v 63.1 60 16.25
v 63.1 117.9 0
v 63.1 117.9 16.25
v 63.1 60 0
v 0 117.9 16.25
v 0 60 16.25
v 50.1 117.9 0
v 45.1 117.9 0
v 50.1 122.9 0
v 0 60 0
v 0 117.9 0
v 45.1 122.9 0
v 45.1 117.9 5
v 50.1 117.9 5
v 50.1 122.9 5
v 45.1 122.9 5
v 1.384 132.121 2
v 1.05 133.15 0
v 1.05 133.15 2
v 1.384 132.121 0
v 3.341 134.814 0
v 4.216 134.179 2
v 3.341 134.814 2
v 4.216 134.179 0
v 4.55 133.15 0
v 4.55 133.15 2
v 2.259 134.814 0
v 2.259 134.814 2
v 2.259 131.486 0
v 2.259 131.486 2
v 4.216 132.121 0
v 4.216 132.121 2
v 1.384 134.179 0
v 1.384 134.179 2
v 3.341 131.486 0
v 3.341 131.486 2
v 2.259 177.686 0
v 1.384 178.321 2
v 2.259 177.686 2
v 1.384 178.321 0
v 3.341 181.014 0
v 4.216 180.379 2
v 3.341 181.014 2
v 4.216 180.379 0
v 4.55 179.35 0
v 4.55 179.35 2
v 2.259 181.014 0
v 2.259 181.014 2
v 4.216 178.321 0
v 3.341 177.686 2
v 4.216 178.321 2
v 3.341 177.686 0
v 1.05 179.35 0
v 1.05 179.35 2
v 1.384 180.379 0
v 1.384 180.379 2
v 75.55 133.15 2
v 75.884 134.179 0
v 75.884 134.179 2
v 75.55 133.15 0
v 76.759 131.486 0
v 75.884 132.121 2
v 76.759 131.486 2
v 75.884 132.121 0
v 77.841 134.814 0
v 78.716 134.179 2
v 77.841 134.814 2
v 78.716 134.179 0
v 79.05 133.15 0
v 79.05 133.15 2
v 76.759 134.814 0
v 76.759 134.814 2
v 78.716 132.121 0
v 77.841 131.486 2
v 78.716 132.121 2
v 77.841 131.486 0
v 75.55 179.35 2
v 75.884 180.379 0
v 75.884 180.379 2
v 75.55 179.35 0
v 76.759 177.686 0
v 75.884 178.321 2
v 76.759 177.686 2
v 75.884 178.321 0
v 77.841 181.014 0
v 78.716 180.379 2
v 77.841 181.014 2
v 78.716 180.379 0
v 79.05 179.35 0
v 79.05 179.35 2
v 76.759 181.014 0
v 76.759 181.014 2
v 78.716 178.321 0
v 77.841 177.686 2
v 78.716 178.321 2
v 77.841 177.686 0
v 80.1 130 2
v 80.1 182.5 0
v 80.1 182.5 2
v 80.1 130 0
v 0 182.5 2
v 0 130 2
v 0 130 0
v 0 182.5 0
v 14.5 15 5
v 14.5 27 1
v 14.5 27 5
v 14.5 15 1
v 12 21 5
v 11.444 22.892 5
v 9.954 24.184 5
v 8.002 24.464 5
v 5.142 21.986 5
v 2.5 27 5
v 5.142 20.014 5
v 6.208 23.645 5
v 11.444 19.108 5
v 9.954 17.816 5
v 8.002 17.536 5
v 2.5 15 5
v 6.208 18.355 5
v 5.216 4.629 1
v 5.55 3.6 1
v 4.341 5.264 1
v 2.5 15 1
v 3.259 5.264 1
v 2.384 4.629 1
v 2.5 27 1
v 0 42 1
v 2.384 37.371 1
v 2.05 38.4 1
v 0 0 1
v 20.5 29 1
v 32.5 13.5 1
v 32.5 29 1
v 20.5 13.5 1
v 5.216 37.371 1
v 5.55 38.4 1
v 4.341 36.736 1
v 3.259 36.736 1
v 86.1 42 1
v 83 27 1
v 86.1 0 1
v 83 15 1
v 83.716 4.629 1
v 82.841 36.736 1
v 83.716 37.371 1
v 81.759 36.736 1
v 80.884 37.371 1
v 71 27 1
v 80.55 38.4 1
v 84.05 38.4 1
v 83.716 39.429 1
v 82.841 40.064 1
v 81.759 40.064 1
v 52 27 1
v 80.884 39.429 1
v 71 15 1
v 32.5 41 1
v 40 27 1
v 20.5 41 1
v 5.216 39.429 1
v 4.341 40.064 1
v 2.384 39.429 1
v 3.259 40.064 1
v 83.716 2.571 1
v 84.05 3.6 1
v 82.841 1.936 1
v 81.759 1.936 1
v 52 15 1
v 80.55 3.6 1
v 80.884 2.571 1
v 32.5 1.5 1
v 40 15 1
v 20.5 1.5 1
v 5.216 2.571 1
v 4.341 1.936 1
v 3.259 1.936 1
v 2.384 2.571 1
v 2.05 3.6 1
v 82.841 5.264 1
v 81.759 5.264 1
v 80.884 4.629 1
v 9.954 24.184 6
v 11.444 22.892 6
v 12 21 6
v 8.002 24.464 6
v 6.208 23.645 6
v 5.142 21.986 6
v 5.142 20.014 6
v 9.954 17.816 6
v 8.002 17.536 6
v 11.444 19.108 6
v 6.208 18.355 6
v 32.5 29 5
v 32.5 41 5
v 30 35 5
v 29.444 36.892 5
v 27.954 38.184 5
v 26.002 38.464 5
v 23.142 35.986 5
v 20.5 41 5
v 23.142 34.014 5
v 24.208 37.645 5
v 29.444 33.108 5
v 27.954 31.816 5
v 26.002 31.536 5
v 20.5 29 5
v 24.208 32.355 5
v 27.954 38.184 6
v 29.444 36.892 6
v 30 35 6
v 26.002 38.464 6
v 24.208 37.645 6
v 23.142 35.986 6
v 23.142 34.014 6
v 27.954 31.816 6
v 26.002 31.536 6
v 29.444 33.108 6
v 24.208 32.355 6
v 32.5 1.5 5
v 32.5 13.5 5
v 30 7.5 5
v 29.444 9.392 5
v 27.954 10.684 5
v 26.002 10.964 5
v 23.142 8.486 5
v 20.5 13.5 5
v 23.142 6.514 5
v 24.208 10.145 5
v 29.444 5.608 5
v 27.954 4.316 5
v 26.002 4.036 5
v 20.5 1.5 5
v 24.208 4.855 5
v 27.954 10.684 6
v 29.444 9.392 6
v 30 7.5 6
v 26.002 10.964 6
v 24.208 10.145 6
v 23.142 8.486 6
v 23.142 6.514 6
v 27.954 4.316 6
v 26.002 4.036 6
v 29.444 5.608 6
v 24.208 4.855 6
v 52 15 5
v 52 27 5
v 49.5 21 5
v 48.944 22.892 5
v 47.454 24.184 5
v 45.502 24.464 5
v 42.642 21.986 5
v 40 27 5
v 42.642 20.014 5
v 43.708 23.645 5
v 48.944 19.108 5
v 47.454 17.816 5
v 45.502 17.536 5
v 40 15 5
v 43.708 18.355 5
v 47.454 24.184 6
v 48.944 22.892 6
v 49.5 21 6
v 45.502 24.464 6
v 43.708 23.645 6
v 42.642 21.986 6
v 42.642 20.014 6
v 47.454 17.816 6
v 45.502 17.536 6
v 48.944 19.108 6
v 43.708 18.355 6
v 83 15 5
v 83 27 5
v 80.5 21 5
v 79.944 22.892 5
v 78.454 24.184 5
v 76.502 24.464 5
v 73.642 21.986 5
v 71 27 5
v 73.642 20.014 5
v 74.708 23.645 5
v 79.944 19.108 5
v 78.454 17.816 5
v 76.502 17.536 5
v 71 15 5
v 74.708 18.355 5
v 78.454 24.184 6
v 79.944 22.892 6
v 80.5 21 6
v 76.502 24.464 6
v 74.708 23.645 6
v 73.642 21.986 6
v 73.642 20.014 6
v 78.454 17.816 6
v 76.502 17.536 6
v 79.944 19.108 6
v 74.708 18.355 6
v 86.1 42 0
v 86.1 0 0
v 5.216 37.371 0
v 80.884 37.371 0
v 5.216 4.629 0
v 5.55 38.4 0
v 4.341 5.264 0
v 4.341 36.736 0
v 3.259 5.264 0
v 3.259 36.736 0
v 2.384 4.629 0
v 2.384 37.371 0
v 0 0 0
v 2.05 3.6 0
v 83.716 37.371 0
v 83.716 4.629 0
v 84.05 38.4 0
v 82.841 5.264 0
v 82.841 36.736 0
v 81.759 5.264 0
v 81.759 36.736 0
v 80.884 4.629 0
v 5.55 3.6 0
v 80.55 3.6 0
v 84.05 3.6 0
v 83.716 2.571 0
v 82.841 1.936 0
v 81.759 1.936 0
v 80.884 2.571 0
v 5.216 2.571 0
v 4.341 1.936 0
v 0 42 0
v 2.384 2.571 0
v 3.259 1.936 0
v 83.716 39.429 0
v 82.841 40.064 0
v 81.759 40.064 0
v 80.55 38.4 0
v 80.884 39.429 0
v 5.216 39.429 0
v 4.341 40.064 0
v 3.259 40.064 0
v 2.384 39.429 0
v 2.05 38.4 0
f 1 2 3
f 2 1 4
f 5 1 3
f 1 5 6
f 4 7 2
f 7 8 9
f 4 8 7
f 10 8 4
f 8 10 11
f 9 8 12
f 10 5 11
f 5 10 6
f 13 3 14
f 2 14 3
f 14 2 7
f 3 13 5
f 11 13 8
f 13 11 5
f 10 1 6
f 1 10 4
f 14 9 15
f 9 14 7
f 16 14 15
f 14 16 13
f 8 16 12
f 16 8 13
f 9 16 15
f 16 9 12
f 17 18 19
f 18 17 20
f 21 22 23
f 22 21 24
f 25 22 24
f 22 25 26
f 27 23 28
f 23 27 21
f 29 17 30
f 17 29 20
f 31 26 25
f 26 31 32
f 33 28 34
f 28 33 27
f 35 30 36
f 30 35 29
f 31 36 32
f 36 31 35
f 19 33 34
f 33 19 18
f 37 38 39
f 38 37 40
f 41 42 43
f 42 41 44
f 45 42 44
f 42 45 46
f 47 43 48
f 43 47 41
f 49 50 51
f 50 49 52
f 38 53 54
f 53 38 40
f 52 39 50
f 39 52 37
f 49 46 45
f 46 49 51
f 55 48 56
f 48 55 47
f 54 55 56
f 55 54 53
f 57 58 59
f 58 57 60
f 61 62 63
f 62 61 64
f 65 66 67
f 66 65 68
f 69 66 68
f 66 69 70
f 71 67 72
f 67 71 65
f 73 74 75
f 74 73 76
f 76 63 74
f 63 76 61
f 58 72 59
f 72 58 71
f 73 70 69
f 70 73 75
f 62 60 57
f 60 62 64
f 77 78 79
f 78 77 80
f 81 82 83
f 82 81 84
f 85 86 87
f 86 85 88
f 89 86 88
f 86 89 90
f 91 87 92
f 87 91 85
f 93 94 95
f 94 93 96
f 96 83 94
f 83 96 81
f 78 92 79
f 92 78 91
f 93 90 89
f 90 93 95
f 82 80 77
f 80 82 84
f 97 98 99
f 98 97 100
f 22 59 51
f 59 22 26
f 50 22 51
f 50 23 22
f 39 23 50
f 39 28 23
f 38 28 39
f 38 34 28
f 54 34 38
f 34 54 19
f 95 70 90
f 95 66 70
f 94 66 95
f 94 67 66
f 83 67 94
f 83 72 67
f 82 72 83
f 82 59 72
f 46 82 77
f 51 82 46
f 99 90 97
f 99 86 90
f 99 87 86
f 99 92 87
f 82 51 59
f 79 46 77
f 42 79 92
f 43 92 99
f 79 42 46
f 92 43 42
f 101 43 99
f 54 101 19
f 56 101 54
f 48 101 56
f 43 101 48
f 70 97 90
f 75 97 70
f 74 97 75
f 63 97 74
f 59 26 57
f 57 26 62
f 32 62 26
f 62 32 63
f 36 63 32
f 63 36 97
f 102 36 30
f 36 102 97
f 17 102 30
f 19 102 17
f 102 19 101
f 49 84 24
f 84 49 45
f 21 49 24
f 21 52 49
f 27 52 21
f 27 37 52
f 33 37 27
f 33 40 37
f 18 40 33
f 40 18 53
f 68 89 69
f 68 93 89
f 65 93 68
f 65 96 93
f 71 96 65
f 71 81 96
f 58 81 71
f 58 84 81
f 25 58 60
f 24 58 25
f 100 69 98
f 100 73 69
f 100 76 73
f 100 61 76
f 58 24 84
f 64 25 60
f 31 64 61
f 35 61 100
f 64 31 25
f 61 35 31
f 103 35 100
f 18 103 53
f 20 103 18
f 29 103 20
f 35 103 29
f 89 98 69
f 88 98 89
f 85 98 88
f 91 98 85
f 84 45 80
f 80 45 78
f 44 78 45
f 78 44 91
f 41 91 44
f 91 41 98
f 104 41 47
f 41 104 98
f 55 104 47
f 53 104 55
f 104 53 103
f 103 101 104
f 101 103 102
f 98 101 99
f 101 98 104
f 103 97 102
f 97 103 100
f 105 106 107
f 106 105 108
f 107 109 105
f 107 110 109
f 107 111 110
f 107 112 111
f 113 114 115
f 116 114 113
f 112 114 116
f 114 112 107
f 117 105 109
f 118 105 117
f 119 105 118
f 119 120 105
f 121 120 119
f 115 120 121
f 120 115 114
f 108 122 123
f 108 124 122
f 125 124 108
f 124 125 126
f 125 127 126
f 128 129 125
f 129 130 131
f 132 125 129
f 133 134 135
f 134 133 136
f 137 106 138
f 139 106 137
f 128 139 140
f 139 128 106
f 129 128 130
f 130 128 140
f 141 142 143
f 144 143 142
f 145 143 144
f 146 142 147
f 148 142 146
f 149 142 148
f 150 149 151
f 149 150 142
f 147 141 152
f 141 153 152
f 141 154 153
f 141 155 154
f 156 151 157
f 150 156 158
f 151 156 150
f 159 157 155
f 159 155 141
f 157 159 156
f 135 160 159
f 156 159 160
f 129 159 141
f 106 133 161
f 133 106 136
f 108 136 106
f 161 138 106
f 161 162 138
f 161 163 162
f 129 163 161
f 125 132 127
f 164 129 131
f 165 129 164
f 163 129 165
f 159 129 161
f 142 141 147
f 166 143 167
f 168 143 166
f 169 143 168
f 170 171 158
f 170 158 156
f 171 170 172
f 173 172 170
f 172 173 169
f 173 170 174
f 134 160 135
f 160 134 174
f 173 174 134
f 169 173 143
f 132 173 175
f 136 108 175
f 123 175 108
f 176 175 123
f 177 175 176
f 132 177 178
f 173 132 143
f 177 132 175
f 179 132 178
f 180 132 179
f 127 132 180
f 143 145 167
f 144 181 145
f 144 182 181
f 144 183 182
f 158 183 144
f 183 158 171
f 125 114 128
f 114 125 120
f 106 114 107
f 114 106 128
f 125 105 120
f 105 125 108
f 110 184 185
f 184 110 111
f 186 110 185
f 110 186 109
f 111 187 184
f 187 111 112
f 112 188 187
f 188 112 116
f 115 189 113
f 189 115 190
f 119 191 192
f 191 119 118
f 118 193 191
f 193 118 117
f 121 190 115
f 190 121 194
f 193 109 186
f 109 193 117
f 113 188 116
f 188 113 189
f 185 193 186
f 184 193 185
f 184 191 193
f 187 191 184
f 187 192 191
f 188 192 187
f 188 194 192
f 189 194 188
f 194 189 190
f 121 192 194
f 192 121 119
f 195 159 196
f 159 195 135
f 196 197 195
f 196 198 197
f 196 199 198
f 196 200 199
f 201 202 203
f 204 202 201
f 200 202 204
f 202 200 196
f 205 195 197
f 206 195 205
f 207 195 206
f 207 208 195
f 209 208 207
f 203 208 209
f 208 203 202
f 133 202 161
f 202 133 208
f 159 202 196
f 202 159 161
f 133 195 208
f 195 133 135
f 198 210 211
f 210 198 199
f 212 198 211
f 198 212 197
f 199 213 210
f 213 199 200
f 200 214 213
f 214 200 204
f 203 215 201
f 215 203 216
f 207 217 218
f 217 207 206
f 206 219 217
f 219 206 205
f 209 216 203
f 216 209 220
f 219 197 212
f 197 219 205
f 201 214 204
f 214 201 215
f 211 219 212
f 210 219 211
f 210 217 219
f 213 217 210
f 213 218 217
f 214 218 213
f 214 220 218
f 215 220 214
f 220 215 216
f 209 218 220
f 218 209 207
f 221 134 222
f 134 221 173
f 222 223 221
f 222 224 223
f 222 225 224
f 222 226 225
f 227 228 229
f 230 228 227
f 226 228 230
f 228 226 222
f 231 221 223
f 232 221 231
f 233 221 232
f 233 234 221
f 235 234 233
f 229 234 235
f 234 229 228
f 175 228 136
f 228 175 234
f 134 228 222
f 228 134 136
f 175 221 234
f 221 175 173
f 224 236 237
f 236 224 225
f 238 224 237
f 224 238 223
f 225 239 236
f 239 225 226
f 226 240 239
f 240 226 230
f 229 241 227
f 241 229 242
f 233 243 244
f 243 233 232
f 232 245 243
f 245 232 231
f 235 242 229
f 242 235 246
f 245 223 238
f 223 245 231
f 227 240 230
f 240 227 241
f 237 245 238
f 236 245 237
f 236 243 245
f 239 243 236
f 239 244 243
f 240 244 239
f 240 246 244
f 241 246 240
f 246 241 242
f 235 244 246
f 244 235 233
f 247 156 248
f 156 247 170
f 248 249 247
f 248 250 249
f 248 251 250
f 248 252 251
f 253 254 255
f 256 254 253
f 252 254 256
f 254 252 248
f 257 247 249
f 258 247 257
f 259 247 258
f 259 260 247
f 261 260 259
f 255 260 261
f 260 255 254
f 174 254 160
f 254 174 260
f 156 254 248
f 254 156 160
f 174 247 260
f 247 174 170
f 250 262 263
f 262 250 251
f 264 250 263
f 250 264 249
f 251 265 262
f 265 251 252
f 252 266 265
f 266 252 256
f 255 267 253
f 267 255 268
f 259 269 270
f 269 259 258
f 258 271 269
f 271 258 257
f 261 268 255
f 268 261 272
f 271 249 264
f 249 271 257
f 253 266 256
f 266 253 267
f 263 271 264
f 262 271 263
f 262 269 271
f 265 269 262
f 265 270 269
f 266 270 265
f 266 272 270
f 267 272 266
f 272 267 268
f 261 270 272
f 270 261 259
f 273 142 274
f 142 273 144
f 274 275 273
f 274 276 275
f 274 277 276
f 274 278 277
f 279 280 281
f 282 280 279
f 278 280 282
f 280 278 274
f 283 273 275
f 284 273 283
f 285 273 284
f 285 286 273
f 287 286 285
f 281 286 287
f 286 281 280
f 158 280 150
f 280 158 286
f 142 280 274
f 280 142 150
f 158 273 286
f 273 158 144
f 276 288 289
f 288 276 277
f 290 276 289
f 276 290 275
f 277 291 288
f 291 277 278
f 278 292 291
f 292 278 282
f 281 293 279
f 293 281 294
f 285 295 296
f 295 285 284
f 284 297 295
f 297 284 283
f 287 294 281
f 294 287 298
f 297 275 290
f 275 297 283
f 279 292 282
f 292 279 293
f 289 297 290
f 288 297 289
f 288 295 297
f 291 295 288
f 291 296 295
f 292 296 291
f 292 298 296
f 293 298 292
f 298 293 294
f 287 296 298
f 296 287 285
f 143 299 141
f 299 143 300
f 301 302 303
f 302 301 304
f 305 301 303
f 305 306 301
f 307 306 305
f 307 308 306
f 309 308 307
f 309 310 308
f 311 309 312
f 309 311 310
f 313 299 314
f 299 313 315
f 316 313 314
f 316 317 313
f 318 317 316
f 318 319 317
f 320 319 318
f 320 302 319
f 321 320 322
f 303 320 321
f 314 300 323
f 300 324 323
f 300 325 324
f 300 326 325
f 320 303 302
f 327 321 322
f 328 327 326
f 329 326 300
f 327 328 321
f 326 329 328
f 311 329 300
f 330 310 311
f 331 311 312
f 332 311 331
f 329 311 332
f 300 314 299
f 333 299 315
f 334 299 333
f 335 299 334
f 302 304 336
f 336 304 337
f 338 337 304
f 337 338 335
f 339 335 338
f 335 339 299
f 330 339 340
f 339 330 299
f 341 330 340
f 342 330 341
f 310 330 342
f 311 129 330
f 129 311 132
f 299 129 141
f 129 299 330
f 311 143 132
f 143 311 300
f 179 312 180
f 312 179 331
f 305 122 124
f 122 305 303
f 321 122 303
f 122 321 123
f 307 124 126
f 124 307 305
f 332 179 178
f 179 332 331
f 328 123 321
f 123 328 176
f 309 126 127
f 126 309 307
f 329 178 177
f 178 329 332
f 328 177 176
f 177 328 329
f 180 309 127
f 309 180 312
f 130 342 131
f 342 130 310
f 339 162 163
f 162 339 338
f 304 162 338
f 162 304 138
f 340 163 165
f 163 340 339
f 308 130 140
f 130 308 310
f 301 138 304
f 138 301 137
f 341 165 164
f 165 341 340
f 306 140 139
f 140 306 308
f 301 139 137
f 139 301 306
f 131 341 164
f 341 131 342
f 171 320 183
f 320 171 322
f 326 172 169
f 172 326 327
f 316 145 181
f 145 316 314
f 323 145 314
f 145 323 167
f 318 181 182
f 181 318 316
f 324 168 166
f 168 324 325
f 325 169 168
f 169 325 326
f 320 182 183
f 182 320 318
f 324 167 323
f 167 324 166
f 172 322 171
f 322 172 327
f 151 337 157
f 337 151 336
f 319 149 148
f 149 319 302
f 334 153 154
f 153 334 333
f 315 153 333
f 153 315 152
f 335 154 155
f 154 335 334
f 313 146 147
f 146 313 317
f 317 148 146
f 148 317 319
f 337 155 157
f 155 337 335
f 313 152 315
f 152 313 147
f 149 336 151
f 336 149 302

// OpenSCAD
module battery_pack()
{
  cube([63.1, 57.9, 16.25]);
  translate([63.1-13-5, 57.9, 0])
    cube([5, 5, 5]);
}


module control_board()
{
  difference()
  {
    cube([80.1, 52.5, 2]);
    translate([(80.1-74.5)/2, (52.5-46.2)/2, 0])
      for(dx=[0, 74.5])
        for(dy=[0,46.2])
          translate([dx, dy, -1])
            cylinder(r=3.5/2, h=2+1+1, $fn=10);
  }
}


module button_()
{
  cube([12, 12, 4]);
  translate([12/2, 12/2, 4])
    cylinder(r=7/2, h=1);
}

module buttons_board()
{
  difference()
  {
    union()
    {
      cube([86.10, 42, 1]);
      translate([0,0,1])
      {
        // "left"
        translate([2.5, 15, 0])
          button_();
        // "up"
        translate([20.5, 29, 0])
          button_();
        // "down"
        translate([20.5, 1.5, 0])
          button_();
        // "right"
        translate([40, 15, 0])
          button_();
        // "start"
        translate([71, 15, 0])
          button_();
      }
    }
    translate([(86.1-78.5)/2, (42-34.8)/2, 0])
      for(dx=[0, 78.5])
        for(dy=[0, 34.8])
          translate([dx, dy, -1])
            cylinder(r=3.5/2, h=1+1+1, $fn=10);
  }
}

translate([0, 60, 0])
  battery_pack();
translate([0, 130, 0])
  control_board();
buttons_board();
